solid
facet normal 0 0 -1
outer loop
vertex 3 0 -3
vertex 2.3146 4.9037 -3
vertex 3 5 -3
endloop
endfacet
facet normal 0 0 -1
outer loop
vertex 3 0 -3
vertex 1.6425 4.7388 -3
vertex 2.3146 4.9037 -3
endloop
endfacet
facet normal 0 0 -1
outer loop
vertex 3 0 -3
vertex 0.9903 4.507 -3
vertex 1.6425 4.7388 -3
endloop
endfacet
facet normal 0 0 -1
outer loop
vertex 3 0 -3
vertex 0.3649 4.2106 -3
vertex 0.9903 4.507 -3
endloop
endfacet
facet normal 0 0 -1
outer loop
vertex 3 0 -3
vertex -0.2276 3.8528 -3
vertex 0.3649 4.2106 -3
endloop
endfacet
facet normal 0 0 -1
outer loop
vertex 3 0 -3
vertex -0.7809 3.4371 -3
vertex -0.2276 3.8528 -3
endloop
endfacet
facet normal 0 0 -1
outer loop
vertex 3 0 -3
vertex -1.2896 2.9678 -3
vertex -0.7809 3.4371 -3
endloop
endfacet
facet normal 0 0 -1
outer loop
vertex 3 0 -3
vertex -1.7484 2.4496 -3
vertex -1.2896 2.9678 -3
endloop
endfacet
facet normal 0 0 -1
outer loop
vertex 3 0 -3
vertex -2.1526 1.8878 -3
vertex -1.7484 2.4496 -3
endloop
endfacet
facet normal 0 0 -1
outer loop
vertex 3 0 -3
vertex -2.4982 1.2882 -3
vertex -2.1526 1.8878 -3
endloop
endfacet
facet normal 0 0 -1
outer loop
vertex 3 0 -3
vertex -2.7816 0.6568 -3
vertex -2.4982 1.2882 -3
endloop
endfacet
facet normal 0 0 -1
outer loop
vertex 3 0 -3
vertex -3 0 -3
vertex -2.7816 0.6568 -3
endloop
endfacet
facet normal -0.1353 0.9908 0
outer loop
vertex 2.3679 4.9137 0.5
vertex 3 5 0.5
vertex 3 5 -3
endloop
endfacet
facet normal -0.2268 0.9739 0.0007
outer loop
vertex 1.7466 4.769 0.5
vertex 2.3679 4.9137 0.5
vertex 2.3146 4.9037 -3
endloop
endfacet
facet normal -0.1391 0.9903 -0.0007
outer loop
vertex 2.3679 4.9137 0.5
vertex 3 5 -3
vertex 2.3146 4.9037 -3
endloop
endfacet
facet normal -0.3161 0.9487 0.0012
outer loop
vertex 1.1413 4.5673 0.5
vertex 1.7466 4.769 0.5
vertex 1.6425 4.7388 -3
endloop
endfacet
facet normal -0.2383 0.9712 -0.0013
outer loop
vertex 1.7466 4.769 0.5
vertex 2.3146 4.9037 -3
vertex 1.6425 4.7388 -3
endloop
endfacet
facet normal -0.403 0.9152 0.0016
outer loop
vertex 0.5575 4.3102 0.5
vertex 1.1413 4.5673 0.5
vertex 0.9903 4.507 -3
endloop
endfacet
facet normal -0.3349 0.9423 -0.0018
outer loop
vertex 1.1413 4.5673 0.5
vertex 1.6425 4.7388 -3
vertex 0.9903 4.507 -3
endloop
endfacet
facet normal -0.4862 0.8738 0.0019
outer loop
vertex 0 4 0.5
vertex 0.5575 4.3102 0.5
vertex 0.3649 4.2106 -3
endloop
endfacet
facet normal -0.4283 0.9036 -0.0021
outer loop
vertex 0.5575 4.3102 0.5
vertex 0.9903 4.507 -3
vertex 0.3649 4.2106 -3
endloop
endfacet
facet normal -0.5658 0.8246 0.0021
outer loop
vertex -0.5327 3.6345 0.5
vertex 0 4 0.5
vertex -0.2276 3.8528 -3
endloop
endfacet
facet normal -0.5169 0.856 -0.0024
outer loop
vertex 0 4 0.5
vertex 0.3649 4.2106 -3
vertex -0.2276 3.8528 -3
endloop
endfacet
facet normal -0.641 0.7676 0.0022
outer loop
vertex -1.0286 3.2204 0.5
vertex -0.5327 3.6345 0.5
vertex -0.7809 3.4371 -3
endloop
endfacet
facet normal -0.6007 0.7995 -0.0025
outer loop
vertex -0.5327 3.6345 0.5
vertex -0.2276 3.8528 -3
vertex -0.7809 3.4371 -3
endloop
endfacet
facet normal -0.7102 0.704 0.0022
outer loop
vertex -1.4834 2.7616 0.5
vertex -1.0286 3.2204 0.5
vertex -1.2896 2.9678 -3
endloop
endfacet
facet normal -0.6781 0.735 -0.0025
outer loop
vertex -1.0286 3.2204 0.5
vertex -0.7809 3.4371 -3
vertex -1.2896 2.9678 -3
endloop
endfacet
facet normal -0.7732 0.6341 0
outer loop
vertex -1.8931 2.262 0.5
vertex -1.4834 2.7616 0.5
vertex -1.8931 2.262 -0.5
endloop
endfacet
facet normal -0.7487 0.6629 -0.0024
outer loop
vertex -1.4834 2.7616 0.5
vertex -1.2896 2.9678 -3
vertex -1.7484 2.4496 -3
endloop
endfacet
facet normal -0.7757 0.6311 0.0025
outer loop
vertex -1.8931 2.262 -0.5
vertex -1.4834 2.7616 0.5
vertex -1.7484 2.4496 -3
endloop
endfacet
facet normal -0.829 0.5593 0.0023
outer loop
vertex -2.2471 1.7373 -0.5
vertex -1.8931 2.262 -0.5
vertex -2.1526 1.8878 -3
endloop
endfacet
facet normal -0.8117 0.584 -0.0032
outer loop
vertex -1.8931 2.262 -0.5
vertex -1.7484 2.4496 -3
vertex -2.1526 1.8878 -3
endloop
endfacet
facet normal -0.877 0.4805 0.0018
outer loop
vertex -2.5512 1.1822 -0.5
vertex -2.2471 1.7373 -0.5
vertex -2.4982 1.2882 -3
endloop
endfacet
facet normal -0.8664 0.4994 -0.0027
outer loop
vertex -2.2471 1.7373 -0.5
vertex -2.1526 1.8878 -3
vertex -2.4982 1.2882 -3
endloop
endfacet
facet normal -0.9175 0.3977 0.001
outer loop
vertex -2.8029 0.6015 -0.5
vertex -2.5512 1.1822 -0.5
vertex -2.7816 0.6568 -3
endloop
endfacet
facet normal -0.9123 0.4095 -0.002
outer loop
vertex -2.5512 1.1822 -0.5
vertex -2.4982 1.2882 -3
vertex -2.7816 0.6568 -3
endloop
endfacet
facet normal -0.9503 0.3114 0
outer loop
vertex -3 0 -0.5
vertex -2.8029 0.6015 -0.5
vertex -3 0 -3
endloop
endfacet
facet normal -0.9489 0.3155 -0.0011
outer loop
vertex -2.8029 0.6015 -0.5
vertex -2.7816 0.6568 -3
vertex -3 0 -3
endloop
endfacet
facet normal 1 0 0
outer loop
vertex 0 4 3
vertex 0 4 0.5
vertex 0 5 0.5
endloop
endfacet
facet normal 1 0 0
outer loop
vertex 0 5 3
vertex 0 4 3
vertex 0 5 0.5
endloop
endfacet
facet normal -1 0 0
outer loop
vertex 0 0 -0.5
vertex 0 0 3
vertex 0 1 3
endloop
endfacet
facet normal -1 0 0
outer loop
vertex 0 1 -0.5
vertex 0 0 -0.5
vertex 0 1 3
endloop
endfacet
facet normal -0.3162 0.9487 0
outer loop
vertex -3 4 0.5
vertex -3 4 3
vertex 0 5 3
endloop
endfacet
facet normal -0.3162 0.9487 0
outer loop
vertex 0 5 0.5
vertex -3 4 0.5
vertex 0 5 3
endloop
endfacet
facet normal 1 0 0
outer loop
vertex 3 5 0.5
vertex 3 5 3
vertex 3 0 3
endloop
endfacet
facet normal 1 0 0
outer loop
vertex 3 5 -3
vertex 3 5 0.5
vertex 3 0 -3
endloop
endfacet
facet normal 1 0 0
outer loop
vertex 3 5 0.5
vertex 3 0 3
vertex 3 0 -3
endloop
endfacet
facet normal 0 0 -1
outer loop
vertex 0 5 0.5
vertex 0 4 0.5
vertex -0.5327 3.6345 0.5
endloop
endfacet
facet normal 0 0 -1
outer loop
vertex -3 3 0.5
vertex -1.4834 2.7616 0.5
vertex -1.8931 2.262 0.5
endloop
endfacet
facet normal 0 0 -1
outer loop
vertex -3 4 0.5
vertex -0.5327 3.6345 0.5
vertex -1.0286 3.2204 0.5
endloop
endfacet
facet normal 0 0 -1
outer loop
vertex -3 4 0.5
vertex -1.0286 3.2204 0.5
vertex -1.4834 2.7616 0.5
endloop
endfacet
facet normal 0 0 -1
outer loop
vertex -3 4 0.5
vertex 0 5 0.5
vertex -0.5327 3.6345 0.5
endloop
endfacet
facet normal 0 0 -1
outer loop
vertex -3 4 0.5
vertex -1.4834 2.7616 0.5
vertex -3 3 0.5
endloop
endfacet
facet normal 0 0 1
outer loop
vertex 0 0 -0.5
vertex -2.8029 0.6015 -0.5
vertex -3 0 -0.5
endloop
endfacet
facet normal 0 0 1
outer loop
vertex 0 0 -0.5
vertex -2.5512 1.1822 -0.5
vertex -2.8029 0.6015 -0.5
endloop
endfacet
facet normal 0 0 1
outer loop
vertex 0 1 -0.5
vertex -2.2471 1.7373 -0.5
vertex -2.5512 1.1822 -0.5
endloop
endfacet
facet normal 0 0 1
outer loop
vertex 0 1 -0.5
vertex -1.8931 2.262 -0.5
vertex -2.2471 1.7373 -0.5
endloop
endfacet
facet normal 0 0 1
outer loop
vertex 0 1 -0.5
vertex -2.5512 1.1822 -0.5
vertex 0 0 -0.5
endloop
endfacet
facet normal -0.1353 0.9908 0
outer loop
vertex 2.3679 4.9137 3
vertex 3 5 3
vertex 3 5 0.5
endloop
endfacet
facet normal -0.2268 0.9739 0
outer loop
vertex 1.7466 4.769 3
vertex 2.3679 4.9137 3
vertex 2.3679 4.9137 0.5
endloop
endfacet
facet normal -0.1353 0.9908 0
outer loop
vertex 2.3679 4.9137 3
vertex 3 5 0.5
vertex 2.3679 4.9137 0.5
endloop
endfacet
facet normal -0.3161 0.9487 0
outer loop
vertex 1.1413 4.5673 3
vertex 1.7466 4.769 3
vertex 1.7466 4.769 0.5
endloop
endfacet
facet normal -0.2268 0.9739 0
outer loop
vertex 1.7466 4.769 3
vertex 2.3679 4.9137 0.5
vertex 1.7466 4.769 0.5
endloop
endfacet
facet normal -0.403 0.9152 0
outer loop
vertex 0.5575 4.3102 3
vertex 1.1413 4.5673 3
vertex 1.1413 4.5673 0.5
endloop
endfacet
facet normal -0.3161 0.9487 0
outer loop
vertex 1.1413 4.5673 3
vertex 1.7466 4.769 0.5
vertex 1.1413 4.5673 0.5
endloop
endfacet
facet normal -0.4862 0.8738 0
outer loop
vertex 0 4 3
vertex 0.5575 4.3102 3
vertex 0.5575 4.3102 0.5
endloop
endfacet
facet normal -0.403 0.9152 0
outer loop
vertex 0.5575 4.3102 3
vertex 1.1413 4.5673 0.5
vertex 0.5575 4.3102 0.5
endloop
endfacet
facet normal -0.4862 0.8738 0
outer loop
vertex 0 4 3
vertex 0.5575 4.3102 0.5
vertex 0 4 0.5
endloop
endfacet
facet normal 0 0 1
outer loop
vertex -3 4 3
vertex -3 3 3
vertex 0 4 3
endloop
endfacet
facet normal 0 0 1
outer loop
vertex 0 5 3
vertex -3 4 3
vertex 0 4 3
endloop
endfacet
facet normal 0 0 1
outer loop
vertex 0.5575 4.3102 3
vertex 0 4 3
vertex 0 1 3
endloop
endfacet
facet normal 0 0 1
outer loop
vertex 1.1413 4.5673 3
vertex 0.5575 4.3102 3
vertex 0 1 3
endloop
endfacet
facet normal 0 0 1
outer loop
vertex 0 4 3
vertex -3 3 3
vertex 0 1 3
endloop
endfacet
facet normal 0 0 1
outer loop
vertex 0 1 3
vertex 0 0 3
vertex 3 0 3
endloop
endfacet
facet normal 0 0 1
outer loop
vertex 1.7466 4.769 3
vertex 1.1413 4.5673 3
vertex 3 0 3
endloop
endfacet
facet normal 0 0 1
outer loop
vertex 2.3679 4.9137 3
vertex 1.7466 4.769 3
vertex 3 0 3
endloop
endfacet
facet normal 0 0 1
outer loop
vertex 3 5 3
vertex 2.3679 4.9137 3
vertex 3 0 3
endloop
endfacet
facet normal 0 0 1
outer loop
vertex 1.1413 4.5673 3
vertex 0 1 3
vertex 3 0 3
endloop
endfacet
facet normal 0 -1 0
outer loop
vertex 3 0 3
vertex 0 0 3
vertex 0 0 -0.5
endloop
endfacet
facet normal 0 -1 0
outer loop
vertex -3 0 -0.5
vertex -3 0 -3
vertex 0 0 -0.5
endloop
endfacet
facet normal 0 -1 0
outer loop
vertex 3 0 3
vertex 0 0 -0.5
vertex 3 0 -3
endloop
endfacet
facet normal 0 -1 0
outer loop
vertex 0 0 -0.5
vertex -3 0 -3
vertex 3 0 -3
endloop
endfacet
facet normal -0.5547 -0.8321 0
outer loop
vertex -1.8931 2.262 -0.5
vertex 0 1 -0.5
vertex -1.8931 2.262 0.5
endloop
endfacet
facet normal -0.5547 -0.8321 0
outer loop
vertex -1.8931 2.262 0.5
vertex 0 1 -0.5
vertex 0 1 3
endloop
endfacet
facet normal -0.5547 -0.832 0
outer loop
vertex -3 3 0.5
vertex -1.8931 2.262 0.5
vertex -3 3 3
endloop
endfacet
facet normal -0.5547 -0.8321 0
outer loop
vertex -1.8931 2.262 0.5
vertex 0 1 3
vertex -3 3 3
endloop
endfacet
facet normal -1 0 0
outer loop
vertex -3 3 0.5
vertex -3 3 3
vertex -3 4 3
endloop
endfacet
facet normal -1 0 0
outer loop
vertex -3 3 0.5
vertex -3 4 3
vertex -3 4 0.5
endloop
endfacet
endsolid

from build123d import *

# Parameters (mm, degrees)
SKETCH1_W           = 6
SKETCH1_H           = 6
BOSS_EXTRUDE1_DEPTH = 5
CUT_EXTRUDE12_DEPTH = 3.5
CUT_EXTRUDE13_DEPTH = 3.5
CUT_EXTRUDE14_DEPTH = 3.5


with BuildPart() as part:
    # Sketch1 → Boss-Extrude1 (new body)
    with BuildSketch(Plane(origin=(0, 0, 0), x_dir=(1, 0, 0), z_dir=(0, 1, 0))):
        Rectangle(SKETCH1_W, SKETCH1_H)
    extrude(amount=BOSS_EXTRUDE1_DEPTH)

    # Sketch13 → Cut-Extrude12 (cut)
    with BuildSketch(Plane(origin=(0, 0, -3), x_dir=(-1, 0, 0), z_dir=(0, 0, -1))):
        with BuildLine():
            ThreePointArc((-3, 5), (0.780941195, 3.437129434), (3, 0))
            Line((3, 0), (3, 5))
            Line((3, 5), (-3, 5))
        make_face()
    extrude(amount=-CUT_EXTRUDE12_DEPTH, mode=Mode.SUBTRACT)

    # Sketch14 → Cut-Extrude13 (cut)
    with BuildSketch(Plane(origin=(0, 0, 0.5), x_dir=(-1, 0, 0), z_dir=(0, 0, -1))):
        with BuildLine():
            ThreePointArc((-3, 5), (-1.441597312, 4.675208063), (0, 4))
            Line((0, 4), (0, 5))
            Line((0, 5), (-3, 5))
        make_face()
    extrude(amount=-CUT_EXTRUDE13_DEPTH, mode=Mode.SUBTRACT)

    # Sketch15 → Cut-Extrude14 (cut)
    with BuildSketch(Plane.XY.offset(3)):
        Polygon((-3, 4), (0, 5), (-3, 5), align=None)
        Polygon((0, 1), (-3, 3), (-3, 0), (0, 0), align=None)
    extrude(amount=-CUT_EXTRUDE14_DEPTH, mode=Mode.SUBTRACT)


solid = part.part
